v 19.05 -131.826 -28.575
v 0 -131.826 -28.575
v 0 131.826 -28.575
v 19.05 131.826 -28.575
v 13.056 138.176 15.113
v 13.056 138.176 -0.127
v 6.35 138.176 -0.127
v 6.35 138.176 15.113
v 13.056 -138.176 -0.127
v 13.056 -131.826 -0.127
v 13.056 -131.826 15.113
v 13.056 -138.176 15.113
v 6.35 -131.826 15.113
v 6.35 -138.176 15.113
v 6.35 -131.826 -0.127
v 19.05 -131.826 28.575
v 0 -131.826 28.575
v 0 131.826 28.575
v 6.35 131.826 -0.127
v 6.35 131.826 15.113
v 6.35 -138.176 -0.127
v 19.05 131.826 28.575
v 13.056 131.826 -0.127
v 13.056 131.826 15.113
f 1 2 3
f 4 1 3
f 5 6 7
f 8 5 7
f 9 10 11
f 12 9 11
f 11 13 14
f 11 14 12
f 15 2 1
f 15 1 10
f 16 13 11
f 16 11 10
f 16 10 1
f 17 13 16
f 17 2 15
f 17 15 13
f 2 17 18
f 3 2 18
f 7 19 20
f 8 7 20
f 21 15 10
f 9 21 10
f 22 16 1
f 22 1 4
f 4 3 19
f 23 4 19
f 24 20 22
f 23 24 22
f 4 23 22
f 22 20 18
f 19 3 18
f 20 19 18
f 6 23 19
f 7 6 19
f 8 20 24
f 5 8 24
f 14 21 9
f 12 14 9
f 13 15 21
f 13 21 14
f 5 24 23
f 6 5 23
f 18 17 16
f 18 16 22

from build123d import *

# Parameters (mm, degrees)
F0_W     = 263.652
F0_H     = 57.15
F1_DEPTH = 19.05
F2_W     = 6.7056
F2_H     = 15.24
F3_DEPTH = 6.35
F5_DEPTH = 6.35


with BuildPart() as f1:
    # F0 (on Right) → F1 (new body)
    with BuildSketch(Plane.YZ):
        Rectangle(F0_W, F0_H)
    extrude(amount=F1_DEPTH)

    # F2 (on face) → F3 (join)
    with BuildSketch(Plane.XZ.offset(131.826)):
        with Locations((9.7028, 7.493)):
            Rectangle(F2_W, F2_H)
    extrude(amount=F3_DEPTH)

    # F4 (on face) → F5 (join)
    with BuildSketch(Plane(origin=(0, 131.826, 0), x_dir=(-1, 0, 0), z_dir=(0, 1, 0))):
        Polygon((-6.35, 15.113), (-9.525, 15.113), (-13.0556, 15.113), (-13.0556, -0.127), (-6.35, -0.127), align=None)
    extrude(amount=F5_DEPTH)


solid = f1.part
